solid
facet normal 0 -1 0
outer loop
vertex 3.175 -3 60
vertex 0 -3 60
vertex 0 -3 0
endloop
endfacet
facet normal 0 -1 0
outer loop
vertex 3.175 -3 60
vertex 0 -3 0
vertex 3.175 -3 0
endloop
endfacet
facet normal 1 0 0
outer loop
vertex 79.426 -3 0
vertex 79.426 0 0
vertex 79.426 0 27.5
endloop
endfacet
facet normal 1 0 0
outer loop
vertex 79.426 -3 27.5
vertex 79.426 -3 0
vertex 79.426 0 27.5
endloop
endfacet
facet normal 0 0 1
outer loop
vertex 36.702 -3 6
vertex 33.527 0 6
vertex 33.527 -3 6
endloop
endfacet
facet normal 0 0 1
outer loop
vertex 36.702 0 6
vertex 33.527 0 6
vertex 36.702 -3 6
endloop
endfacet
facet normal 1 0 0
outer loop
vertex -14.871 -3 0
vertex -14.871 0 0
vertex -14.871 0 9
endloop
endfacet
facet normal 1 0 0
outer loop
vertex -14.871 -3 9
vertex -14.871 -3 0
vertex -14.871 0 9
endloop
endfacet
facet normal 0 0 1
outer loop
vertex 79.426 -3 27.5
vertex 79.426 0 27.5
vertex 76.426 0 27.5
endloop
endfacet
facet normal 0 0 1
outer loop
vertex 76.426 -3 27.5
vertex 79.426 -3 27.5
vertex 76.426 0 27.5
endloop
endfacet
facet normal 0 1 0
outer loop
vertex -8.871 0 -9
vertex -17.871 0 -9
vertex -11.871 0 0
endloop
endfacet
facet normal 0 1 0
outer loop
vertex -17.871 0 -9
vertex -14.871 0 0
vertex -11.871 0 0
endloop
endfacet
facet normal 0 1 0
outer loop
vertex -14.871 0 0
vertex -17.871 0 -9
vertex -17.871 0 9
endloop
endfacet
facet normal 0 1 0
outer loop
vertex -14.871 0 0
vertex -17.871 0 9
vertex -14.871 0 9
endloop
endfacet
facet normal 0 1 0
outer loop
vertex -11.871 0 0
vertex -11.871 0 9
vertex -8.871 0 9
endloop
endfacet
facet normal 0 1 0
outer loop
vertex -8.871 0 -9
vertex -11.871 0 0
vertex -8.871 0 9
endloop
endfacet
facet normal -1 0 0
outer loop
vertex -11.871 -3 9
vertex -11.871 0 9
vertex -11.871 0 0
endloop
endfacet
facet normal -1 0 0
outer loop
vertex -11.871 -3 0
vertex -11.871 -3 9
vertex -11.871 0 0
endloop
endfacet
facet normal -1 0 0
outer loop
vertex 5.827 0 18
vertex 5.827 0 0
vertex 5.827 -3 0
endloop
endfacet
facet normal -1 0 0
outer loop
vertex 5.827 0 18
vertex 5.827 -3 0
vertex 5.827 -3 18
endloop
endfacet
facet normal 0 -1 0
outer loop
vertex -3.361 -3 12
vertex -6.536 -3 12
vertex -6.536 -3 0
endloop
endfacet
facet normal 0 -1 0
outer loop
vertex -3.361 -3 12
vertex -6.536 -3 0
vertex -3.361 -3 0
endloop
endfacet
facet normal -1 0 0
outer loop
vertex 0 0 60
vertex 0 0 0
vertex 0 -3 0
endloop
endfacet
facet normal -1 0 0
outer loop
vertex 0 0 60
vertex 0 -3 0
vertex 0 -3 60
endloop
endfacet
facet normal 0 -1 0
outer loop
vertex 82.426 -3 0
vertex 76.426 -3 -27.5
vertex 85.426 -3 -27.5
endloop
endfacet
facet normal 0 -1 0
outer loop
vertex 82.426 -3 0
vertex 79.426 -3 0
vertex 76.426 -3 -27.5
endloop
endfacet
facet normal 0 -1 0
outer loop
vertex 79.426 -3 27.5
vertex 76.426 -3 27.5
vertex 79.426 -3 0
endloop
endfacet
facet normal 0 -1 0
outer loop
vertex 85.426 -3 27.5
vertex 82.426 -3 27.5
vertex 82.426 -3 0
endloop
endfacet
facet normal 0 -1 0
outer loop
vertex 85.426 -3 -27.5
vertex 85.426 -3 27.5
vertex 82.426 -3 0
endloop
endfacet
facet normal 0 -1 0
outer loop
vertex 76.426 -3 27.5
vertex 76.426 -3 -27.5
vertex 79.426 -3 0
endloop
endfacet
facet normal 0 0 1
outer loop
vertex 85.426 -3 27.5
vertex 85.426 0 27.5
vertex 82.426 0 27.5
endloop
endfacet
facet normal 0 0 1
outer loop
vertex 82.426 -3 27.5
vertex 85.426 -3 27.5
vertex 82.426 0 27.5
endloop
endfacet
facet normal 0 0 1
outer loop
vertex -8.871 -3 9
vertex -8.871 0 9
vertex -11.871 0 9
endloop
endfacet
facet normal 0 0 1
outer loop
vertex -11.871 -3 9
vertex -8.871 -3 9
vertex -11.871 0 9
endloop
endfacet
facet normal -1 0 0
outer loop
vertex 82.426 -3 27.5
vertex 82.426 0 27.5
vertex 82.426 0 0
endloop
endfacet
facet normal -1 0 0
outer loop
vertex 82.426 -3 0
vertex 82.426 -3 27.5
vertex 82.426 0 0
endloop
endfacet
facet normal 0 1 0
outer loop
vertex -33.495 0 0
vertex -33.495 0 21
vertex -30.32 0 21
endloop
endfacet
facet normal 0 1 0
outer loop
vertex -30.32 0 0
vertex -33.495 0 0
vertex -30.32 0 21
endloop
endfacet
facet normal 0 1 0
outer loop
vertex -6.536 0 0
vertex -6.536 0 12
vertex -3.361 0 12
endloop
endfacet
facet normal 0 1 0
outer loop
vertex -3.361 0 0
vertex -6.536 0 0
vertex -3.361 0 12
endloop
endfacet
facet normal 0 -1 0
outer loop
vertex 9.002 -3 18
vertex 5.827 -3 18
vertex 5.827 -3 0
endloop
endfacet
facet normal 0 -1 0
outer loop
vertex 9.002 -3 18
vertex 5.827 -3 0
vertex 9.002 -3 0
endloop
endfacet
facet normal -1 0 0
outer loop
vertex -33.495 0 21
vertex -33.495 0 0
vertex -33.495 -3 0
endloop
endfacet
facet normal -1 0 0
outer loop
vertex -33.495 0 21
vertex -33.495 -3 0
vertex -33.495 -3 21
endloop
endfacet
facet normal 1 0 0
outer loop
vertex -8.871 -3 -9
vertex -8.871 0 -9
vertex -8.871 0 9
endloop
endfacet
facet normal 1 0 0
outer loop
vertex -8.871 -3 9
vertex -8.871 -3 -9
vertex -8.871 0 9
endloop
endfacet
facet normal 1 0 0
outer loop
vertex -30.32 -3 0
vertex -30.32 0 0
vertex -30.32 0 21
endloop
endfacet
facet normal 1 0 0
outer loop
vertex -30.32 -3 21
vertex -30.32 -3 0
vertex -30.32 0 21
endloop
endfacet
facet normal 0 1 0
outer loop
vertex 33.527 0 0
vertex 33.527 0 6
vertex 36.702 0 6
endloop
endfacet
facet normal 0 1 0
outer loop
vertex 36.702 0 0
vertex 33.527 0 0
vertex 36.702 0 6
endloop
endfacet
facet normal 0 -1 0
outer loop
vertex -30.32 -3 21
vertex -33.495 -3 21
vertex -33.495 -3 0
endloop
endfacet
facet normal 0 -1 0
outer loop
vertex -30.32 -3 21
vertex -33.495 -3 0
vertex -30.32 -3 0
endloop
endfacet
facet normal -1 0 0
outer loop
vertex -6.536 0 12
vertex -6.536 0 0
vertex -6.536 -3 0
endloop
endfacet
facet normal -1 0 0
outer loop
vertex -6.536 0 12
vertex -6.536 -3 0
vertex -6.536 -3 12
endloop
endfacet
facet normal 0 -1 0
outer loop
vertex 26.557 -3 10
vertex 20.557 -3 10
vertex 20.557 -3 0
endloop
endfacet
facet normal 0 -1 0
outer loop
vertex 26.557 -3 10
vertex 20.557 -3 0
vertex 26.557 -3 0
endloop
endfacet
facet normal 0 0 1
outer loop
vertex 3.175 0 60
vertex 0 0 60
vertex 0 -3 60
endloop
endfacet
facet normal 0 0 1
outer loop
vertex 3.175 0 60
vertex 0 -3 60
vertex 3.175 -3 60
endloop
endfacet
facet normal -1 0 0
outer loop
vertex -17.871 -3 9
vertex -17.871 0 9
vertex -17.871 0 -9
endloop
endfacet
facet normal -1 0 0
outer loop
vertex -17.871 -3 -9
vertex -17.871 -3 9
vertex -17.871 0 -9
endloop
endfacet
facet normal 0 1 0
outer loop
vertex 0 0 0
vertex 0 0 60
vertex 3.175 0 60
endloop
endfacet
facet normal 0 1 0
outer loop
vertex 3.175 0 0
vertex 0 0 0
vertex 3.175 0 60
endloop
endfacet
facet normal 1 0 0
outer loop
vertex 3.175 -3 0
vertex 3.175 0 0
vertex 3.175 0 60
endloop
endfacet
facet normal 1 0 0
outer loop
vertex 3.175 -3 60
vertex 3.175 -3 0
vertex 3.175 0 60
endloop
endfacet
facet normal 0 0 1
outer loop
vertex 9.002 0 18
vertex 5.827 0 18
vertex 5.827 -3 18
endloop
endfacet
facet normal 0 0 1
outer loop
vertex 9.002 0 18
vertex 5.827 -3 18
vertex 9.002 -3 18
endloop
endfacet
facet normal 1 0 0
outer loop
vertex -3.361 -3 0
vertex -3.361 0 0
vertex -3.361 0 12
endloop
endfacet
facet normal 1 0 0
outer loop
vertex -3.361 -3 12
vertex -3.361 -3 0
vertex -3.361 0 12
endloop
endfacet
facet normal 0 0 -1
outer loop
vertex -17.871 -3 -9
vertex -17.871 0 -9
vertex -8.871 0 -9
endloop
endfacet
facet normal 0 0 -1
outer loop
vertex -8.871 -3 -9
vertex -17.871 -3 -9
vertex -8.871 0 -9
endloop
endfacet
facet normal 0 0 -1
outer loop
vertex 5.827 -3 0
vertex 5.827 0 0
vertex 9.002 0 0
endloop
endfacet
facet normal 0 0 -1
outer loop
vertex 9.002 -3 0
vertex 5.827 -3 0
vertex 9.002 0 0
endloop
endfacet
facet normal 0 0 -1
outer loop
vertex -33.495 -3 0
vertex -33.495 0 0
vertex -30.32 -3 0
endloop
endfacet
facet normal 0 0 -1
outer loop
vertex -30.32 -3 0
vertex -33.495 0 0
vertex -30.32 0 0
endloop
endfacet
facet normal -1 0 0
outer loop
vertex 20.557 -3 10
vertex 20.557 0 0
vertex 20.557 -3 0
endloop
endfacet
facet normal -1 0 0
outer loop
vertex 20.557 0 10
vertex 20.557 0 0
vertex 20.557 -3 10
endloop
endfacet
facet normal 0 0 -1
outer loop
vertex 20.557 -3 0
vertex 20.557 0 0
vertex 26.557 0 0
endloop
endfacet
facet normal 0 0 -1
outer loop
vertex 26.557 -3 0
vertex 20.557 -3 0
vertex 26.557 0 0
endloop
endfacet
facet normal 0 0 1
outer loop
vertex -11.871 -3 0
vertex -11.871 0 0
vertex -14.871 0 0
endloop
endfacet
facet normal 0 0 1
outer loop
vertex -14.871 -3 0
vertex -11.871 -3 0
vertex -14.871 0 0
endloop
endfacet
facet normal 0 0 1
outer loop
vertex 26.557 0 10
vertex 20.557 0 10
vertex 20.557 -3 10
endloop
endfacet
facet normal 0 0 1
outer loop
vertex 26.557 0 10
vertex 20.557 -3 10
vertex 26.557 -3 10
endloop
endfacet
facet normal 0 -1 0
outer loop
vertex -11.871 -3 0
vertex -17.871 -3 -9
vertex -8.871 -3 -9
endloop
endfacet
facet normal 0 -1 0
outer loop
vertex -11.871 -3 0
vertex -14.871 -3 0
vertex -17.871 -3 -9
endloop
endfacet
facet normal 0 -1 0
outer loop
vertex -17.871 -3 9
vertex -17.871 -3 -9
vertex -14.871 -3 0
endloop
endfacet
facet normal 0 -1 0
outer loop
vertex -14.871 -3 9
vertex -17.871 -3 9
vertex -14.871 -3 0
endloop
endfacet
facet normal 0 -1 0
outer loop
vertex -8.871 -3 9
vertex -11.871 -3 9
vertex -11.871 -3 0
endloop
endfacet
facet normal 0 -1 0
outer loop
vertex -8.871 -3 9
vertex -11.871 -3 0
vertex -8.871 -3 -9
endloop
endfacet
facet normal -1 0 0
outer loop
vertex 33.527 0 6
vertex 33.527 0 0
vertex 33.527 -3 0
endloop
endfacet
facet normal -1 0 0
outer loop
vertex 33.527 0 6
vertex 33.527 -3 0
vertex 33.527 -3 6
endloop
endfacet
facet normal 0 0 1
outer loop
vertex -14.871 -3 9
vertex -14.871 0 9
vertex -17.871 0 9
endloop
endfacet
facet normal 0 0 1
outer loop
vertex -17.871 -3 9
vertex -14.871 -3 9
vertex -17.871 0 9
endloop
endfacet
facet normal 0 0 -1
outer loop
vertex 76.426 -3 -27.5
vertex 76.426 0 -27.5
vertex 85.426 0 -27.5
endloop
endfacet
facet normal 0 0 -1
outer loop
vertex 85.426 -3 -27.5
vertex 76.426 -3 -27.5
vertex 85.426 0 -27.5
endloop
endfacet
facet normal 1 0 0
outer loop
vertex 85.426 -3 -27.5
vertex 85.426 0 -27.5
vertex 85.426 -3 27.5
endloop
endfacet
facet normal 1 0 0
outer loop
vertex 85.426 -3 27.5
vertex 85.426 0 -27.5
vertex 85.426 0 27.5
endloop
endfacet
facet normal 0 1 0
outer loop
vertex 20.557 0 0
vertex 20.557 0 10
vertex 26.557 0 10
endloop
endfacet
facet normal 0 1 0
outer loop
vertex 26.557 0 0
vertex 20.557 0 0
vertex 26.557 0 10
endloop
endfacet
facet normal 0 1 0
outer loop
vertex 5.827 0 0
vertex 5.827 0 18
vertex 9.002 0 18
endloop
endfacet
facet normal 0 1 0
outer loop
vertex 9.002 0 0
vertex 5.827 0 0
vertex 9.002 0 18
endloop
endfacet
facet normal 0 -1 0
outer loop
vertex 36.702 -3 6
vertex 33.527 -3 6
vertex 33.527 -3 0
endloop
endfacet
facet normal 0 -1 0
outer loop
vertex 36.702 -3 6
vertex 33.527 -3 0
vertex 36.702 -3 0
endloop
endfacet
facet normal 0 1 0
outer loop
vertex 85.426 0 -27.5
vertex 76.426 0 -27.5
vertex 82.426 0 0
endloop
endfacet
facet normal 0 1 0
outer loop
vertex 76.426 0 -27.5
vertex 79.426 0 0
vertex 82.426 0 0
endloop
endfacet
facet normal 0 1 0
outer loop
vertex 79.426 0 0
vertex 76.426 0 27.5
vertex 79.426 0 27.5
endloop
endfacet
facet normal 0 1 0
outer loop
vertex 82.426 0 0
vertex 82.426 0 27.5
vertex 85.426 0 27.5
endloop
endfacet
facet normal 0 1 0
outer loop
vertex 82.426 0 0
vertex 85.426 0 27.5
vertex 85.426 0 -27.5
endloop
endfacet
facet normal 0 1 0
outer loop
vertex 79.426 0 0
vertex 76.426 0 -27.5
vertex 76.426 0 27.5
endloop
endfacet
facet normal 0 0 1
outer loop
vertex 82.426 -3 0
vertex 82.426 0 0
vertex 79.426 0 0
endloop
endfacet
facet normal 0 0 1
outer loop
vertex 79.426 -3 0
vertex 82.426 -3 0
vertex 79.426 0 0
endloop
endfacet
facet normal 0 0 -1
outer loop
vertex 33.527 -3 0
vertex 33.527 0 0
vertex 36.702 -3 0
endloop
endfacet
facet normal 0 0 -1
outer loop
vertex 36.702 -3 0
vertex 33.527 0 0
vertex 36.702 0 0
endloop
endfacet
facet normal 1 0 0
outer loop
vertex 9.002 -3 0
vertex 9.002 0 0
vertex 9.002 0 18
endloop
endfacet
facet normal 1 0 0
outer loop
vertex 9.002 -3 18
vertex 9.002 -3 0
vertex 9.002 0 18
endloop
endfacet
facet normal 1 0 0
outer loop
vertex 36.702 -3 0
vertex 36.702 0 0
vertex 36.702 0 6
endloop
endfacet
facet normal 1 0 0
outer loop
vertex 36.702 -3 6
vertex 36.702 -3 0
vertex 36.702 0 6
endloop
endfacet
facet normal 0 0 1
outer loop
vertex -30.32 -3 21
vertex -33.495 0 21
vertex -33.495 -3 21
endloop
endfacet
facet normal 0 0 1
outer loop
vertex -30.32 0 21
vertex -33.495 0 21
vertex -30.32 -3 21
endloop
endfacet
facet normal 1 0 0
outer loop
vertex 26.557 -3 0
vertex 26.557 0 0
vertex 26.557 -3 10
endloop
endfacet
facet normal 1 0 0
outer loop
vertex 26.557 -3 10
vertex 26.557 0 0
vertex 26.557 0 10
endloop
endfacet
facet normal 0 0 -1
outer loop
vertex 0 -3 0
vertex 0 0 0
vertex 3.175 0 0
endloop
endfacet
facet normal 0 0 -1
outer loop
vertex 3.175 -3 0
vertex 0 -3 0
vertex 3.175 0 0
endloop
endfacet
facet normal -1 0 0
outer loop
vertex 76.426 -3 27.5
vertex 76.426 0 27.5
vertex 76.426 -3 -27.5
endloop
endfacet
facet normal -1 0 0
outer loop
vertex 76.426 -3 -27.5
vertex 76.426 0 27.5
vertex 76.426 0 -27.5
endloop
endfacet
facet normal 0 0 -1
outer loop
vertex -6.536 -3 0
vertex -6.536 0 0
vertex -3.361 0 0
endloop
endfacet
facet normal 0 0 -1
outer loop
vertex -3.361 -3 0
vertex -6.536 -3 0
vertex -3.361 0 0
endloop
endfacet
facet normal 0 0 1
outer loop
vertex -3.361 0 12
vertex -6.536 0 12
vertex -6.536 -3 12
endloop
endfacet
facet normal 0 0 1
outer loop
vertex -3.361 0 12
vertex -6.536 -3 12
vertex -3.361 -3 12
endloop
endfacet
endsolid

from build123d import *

# Parameters (mm, degrees)
F0_W      = 3.175
F0_H      = 60
F1_DEPTH  = 3
F2_W      = 3.175
F2_H      = 18
F3_DEPTH  = 3
F4_W      = 6
F4_H      = 10
F5_DEPTH  = 3
F6_W      = 3.175
F6_H      = 12
F7_DEPTH  = 3
F8_W      = 3.175
F8_H      = 6
F9_DEPTH  = 3
F11_DEPTH = 3
F12_W     = 3.175
F12_H     = 21
F13_DEPTH = 3
F15_DEPTH = 3


with BuildPart() as f1:
    # F0 (on Front) → F1 (new body)
    with BuildSketch(Plane.XZ):
        with Locations((1.5875, 30)):
            Rectangle(F0_W, F0_H)
    extrude(amount=F1_DEPTH)


with BuildPart() as f3:
    # F2 (on Front) → F3 (new body)
    with BuildSketch(Plane.XZ):
        with Locations((7.414239, 9)):
            Rectangle(F2_W, F2_H)
    extrude(amount=F3_DEPTH)


with BuildPart() as f5:
    # F4 (on Front) → F5 (new body)
    with BuildSketch(Plane.XZ):
        with Locations((23.557066, 5)):
            Rectangle(F4_W, F4_H)
    extrude(amount=F5_DEPTH)


with BuildPart() as f7:
    # F6 (on Front) → F7 (new body)
    with BuildSketch(Plane.XZ):
        with Locations((-4.948214, 6)):
            Rectangle(F6_W, F6_H)
    extrude(amount=F7_DEPTH)


with BuildPart() as f9:
    # F8 (on Front) → F9 (new body)
    with BuildSketch(Plane.XZ):
        with Locations((35.114715, 3)):
            Rectangle(F8_W, F8_H)
    extrude(amount=F9_DEPTH)


with BuildPart() as f11:
    # F10 (on Front) → F11 (new body)
    with BuildSketch(Plane.XZ):
        Polygon((-8.871202, -9), (-8.871202, 9), (-11.871202, 9), (-11.871202, 0), (-14.871202, 0), (-14.871202, 9), (-17.871202, 9), (-17.871202, -9), align=None)
    extrude(amount=F11_DEPTH)


with BuildPart() as f13:
    # F12 (on Front) → F13 (new body)
    with BuildSketch(Plane.XZ):
        with Locations((-31.907464, 10.5)):
            Rectangle(F12_W, F12_H)
    extrude(amount=F13_DEPTH)


with BuildPart() as f15:
    # F14 (on Front) → F15 (new body)
    with BuildSketch(Plane.XZ):
        Polygon((85.42636, -27.5), (85.42636, 27.5), (82.42636, 27.5), (82.42636, 0), (79.42636, 0), (79.42636, 27.5), (76.42636, 27.5), (76.42636, -27.5), align=None)
    extrude(amount=F15_DEPTH)


solid = Compound([f1.part, f3.part, f5.part, f7.part, f9.part, f11.part, f13.part, f15.part])
